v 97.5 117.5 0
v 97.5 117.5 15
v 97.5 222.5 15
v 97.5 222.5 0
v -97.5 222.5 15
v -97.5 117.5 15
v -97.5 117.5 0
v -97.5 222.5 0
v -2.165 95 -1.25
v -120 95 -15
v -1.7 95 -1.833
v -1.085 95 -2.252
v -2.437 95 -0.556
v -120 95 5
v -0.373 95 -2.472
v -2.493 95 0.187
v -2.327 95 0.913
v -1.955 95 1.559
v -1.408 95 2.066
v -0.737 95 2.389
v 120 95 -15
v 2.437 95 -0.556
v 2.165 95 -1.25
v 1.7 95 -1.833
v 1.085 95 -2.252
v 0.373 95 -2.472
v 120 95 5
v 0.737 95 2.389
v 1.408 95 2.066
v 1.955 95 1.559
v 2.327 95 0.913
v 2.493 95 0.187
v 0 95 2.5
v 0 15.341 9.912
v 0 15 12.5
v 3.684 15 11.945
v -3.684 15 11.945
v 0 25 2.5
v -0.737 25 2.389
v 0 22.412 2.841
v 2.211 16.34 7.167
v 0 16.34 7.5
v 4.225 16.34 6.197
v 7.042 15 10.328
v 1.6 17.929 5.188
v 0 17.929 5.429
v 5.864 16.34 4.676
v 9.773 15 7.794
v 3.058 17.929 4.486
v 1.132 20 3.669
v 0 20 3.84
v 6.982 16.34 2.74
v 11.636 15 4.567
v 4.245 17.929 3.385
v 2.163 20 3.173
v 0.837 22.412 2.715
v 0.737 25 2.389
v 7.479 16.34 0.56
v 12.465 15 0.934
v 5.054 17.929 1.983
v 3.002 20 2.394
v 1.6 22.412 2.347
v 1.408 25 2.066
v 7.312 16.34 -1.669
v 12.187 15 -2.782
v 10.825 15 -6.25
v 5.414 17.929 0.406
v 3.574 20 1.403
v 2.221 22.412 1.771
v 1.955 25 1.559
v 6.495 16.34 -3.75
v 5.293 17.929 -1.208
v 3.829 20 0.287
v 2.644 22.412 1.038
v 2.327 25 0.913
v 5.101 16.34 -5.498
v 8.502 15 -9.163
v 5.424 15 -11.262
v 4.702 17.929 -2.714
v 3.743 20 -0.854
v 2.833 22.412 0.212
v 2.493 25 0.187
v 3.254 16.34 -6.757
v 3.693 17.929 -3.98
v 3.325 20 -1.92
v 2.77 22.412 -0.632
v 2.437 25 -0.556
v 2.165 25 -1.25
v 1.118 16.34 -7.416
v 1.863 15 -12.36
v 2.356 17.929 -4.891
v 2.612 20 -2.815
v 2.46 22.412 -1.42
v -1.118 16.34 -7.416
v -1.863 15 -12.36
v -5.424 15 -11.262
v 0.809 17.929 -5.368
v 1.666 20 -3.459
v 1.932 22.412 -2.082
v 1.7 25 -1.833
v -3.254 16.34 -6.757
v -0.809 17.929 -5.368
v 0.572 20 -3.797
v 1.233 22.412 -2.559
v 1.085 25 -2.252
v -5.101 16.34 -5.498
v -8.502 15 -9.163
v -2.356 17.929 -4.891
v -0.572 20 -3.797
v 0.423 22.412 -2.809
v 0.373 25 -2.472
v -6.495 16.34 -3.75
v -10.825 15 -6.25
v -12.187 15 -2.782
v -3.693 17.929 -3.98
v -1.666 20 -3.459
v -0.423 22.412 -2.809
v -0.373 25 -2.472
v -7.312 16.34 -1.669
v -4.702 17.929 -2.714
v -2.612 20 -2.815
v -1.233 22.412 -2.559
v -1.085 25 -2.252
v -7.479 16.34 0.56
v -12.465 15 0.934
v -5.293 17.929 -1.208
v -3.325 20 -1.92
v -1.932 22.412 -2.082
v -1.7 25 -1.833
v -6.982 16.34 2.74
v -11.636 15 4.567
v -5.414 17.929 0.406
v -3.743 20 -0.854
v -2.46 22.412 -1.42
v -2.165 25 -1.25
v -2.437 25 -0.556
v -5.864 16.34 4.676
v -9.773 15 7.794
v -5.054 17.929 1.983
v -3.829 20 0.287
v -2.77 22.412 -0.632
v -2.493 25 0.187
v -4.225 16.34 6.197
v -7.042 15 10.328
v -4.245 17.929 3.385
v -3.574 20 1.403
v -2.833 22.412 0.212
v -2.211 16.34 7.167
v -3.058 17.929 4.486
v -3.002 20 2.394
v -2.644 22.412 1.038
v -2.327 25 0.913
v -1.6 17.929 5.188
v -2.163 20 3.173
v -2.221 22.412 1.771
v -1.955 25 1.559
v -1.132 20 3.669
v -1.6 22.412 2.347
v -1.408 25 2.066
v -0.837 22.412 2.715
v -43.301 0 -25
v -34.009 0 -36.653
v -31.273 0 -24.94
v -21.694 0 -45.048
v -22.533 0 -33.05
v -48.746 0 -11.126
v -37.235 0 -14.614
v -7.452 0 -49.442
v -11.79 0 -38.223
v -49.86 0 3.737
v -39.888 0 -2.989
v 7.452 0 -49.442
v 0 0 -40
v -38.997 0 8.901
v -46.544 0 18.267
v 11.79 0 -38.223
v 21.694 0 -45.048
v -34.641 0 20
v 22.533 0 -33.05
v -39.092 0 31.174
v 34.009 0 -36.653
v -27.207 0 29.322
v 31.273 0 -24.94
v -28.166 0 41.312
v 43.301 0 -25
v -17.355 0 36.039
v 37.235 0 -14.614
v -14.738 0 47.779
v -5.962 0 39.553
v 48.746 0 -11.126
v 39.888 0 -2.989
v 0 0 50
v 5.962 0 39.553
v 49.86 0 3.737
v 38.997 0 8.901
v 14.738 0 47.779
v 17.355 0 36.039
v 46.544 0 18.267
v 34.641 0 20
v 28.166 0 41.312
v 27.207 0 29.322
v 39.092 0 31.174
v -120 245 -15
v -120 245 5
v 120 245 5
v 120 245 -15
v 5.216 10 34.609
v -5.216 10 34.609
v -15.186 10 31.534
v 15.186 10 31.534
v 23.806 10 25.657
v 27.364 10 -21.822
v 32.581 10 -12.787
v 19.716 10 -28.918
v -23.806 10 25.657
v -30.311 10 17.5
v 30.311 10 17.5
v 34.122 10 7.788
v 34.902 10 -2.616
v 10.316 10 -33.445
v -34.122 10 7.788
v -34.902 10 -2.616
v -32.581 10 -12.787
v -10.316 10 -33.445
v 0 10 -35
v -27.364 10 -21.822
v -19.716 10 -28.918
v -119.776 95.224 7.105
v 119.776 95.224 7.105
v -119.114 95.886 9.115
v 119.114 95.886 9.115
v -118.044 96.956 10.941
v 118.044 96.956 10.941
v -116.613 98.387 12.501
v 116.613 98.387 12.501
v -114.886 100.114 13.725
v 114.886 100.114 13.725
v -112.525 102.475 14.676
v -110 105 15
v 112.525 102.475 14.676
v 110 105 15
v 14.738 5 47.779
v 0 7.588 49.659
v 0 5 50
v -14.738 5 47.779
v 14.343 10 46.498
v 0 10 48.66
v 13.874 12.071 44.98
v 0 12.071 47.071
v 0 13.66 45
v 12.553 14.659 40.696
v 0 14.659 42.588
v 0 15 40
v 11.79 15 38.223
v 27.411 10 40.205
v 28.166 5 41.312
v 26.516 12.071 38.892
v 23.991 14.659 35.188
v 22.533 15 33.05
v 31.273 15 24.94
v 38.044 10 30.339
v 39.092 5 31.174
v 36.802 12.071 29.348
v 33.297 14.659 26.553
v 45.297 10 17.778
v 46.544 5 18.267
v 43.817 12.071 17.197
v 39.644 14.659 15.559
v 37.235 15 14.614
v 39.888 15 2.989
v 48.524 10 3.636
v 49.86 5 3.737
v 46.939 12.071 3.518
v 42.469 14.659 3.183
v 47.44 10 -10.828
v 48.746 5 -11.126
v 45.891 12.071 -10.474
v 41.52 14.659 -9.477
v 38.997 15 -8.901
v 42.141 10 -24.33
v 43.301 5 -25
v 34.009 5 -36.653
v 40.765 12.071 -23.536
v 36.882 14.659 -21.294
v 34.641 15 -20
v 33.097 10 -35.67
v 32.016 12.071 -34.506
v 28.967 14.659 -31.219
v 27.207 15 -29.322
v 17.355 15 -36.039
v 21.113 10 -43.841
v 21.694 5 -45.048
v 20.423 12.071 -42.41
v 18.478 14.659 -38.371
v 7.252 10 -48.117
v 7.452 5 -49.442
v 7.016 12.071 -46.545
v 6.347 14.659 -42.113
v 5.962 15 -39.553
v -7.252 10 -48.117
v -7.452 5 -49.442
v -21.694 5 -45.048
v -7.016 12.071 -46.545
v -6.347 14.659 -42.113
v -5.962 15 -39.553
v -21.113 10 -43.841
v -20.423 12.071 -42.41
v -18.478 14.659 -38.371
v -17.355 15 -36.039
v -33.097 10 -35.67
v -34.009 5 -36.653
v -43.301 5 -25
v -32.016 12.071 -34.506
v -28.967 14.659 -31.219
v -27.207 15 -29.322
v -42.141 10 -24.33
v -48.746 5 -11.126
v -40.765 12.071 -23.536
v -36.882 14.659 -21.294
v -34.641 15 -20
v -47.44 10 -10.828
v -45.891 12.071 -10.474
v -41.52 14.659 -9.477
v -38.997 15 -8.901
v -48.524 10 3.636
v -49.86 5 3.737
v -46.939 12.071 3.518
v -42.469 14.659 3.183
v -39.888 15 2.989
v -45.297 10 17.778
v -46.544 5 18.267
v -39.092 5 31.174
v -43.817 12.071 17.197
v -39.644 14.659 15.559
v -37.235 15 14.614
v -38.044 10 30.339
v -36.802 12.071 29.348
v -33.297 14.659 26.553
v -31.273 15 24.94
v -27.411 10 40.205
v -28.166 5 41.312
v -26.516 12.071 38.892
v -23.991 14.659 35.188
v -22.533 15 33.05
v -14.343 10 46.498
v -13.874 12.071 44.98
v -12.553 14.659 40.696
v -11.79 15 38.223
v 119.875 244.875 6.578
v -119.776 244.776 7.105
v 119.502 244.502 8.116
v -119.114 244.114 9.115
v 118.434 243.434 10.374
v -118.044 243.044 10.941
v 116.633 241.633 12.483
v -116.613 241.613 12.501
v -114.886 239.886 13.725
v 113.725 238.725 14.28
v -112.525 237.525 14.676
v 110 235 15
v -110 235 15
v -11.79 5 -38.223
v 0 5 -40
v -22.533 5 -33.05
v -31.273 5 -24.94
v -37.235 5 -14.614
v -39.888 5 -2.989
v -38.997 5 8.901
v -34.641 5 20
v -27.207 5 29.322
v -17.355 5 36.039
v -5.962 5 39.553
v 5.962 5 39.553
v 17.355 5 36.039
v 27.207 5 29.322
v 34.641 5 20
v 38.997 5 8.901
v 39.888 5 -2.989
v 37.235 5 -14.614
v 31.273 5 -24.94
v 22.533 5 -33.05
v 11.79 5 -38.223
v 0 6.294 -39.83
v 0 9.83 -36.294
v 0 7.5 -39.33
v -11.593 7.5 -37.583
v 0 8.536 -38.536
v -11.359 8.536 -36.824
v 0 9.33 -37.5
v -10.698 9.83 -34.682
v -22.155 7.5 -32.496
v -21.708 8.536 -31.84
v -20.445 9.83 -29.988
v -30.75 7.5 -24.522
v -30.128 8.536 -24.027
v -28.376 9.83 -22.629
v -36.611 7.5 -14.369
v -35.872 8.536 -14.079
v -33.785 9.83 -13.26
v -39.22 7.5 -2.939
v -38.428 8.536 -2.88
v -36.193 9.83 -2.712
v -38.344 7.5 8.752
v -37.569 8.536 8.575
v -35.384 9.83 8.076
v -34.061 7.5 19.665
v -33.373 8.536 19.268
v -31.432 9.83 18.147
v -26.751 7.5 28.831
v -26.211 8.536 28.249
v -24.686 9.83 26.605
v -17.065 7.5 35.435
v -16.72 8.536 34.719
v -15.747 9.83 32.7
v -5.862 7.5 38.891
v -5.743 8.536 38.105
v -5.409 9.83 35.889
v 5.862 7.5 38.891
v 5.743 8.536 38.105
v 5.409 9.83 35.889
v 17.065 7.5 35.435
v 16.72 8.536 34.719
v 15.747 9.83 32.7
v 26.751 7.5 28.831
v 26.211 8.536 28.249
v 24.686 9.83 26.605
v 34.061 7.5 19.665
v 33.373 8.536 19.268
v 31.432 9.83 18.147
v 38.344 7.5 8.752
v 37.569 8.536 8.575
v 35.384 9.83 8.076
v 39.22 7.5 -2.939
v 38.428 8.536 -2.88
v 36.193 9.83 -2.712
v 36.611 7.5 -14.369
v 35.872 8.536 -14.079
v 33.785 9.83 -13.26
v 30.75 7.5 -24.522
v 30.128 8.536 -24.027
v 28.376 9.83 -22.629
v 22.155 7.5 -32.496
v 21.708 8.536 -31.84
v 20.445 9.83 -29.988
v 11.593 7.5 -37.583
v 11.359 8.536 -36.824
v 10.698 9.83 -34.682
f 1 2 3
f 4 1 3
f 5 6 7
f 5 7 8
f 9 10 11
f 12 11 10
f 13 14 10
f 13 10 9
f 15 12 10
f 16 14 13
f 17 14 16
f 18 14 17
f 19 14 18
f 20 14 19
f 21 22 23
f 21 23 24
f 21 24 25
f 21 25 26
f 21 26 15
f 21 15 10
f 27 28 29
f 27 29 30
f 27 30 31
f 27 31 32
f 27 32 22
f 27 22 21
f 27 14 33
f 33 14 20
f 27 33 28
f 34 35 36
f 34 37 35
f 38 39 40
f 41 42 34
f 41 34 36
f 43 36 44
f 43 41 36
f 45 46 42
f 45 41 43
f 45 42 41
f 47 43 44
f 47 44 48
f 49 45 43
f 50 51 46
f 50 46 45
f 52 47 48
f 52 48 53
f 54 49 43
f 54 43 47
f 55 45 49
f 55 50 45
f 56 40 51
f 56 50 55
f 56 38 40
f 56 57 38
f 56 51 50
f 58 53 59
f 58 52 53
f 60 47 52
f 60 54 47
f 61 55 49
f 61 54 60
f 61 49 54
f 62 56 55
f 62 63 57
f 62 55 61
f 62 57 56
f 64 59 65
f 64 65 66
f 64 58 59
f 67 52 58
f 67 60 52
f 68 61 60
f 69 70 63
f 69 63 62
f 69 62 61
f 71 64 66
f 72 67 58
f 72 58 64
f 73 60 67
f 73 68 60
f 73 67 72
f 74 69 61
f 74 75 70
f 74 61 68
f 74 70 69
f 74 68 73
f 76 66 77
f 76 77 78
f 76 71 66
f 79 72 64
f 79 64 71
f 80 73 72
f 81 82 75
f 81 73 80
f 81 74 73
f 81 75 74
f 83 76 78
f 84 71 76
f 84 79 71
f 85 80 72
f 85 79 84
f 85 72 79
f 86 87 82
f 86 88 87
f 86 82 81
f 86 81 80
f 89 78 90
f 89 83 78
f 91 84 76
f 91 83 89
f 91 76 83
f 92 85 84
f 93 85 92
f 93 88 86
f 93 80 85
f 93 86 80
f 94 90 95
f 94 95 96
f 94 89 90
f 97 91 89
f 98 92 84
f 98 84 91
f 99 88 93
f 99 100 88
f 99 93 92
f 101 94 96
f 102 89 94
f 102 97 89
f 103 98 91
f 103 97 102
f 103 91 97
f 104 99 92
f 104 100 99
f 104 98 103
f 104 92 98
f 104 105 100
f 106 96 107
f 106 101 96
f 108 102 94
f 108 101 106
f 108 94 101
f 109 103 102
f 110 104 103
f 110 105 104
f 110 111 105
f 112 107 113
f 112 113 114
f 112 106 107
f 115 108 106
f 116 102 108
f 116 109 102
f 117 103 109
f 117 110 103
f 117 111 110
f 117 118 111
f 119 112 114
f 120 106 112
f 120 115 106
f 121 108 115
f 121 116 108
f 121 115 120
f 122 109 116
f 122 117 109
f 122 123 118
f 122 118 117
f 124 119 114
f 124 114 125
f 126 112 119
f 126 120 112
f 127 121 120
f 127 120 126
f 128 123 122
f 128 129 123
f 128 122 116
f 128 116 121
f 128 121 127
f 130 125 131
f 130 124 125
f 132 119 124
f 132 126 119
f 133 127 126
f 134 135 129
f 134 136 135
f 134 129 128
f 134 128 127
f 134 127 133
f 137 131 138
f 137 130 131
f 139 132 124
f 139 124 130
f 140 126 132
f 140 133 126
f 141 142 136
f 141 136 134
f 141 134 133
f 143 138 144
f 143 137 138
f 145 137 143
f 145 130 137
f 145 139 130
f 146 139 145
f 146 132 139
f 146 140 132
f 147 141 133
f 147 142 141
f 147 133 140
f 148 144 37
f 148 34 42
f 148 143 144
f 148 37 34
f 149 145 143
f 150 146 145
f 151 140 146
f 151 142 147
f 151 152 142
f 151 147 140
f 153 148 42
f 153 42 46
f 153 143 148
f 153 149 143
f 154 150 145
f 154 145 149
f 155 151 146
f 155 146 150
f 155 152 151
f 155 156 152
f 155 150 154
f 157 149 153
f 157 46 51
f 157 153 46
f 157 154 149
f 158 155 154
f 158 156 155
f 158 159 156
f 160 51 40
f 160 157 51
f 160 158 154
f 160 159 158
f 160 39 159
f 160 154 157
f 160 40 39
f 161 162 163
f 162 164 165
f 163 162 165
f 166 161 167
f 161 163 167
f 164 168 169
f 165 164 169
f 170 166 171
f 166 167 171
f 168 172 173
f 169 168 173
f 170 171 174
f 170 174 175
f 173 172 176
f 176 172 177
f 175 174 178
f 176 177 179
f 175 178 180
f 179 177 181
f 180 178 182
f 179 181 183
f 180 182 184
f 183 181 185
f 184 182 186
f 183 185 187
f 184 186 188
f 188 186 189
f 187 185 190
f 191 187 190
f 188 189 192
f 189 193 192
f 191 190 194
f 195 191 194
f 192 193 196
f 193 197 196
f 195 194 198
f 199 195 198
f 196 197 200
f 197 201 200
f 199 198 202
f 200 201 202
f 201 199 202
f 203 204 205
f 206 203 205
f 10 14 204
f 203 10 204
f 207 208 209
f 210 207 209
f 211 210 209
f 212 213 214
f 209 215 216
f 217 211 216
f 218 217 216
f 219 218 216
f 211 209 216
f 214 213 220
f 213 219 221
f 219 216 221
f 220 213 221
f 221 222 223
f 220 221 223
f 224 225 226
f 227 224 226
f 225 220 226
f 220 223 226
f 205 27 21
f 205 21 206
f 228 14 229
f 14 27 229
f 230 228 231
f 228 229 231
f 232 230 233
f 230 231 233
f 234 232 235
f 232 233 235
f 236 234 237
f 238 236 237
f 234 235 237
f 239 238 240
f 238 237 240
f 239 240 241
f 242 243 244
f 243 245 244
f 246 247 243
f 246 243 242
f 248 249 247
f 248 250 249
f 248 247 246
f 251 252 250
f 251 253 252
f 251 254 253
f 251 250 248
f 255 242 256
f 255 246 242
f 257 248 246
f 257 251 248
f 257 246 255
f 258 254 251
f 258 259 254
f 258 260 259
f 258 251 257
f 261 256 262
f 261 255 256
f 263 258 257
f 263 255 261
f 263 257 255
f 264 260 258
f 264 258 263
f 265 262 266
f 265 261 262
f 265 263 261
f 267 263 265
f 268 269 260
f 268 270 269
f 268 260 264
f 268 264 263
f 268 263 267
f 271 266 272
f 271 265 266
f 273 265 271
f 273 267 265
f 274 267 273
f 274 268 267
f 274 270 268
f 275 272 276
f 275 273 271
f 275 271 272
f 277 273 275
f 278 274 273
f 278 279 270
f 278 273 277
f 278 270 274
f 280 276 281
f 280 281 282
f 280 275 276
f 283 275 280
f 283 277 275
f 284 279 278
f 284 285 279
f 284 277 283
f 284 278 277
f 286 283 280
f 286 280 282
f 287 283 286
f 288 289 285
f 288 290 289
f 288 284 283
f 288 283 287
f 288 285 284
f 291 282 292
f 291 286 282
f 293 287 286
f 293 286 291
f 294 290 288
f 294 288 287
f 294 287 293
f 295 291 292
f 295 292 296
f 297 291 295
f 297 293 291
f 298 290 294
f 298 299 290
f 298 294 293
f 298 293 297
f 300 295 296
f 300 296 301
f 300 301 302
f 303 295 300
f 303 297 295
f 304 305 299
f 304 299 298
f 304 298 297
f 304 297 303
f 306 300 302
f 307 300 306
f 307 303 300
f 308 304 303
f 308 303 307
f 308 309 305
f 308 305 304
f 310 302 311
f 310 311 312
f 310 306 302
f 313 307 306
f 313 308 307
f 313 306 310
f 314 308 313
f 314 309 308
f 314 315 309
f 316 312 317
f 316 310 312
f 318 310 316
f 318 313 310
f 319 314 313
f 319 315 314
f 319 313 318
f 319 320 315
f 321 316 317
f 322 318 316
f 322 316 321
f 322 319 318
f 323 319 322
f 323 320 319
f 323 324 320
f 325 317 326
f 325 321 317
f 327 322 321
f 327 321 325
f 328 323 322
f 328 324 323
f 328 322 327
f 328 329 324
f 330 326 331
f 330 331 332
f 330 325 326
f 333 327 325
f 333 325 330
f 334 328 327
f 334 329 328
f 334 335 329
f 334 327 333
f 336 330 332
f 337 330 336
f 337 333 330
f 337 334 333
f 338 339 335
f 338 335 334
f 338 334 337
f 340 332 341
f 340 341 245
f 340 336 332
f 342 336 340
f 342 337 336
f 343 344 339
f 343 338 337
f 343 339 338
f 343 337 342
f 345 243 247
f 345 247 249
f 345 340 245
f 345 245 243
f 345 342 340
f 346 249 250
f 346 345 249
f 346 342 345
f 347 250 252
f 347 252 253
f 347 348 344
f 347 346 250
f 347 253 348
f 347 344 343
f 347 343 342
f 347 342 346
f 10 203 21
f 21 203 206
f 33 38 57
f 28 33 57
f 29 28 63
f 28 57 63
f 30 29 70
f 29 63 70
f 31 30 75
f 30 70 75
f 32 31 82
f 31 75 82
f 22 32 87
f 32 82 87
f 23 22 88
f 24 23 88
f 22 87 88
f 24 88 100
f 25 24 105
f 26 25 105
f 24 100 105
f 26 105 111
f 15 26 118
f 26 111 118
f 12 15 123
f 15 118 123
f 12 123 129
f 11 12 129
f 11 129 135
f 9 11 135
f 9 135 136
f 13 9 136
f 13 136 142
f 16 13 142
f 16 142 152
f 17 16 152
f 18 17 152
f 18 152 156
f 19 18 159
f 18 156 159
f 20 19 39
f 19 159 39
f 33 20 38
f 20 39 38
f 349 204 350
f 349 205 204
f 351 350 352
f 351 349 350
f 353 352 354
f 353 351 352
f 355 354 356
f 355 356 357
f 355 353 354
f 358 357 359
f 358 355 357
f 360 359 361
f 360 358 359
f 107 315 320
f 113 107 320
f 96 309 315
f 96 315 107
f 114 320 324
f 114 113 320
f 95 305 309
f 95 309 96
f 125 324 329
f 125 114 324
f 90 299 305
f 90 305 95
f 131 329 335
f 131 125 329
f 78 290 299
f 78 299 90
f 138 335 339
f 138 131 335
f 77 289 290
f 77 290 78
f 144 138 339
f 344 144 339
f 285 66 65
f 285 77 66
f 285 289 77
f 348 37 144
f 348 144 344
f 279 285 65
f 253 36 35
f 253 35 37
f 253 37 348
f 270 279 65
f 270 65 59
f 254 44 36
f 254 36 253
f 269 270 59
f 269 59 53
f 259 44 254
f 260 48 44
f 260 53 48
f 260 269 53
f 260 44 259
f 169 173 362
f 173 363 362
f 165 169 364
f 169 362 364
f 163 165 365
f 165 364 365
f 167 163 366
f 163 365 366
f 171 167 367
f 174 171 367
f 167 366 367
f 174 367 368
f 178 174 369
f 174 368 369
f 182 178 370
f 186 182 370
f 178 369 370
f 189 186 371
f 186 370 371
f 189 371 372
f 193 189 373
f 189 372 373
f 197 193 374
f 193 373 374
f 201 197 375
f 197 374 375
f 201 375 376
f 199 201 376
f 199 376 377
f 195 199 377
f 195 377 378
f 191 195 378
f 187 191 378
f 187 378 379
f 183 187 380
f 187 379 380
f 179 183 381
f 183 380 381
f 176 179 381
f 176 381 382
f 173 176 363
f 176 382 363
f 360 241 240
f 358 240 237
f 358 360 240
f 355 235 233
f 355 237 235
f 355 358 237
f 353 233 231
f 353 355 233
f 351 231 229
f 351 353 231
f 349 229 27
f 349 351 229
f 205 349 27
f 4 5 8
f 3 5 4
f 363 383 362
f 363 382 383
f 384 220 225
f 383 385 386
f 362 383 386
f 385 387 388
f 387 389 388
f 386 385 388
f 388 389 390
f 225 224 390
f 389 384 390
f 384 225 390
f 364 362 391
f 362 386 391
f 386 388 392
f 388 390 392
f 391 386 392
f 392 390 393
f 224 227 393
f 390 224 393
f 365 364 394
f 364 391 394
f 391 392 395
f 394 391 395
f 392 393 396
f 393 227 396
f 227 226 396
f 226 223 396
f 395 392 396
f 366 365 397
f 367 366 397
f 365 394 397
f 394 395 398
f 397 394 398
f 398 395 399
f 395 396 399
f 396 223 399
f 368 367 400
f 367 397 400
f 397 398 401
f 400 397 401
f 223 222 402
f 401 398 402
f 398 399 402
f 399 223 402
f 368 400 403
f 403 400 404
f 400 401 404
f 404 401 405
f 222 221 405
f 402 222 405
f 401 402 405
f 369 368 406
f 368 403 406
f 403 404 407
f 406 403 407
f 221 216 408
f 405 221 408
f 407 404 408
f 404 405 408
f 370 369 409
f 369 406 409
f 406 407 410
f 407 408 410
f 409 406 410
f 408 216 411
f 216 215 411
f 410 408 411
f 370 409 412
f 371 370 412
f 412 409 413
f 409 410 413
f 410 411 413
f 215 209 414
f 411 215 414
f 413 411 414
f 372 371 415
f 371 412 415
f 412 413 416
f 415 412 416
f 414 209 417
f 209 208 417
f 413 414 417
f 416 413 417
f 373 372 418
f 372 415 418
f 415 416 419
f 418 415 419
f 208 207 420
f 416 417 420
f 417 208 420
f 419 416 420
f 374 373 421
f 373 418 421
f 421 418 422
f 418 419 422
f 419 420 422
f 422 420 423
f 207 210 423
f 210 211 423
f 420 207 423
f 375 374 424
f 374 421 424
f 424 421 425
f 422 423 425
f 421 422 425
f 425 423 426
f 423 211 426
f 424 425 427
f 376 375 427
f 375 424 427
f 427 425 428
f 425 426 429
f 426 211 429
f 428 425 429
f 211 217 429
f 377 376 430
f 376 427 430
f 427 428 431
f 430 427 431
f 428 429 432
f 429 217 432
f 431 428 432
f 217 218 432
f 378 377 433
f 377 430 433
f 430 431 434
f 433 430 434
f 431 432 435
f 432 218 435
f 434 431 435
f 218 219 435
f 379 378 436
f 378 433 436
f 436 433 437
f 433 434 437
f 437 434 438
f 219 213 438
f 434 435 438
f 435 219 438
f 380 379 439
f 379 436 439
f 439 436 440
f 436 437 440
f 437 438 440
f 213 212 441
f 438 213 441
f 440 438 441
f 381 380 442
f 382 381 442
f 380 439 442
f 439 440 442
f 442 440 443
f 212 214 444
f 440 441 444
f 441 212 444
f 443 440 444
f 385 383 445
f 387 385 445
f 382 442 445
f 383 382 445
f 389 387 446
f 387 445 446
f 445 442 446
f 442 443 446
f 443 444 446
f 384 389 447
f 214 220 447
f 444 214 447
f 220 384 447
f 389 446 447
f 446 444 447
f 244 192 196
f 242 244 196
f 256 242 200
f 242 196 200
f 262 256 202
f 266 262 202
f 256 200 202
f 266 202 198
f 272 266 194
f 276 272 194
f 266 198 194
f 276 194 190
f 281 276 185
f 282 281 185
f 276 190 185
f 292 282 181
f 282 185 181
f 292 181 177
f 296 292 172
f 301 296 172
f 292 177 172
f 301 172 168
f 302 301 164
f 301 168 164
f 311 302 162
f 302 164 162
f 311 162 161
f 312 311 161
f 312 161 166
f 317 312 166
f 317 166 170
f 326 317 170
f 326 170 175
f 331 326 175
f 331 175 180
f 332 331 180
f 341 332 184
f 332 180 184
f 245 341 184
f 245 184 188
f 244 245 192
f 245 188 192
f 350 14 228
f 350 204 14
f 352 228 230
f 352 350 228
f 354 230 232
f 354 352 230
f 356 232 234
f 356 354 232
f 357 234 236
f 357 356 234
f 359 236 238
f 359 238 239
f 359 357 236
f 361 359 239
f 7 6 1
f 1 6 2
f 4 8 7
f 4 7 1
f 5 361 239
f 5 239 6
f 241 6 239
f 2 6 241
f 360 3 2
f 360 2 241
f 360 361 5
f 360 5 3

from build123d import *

# Parameters (mm, degrees)
SKETCH1_R           = 50
BOSS_EXTRUDE1_DEPTH = 15
FILLET1_R           = 10
SKETCH5_R           = 2.5
BOSS_EXTRUDE2_DEPTH = 80
FILLET2_R           = 10
SKETCH6_W           = 240
SKETCH6_H           = 150
BOSS_EXTRUDE3_DEPTH = 15
SKETCH7_W           = 195
SKETCH7_H           = 105
CUT_EXTRUDE1_DEPTH  = 15
FILLET3_R           = 10


with BuildPart() as part:
    # Sketch1 → Boss-Extrude1 (new body)
    with BuildSketch(Plane(origin=(0, 0, 0), x_dir=(1, 0, 0), z_dir=(0, 1, 0))):
        with Locations(Location((0, 0, 0), (0, 0, 270))):
            Circle(SKETCH1_R)
    extrude(amount=BOSS_EXTRUDE1_DEPTH)

    # Fillet1
    fillet1_edges = [part.edges().sort_by_distance(p)[0] for p in [
        (0, 15, -50),
    ]]
    fillet(fillet1_edges, radius=FILLET1_R)

    # Sketch3 → Cut-Revolve1 (revolve, cut)
    with BuildSketch(Plane.XY, mode=Mode.PRIVATE) as cut_revolve1_sk:
        with BuildLine():
            Line((0, 0), (40, 0))
            Line((40, 0), (40, 5))
            ThreePointArc((40, 5), (38.535533906, 8.535533906), (35, 10))
            Line((35, 10), (0, 10))
            Line((0, 10), (0, 0))
        make_face()
    revolve(cut_revolve1_sk.sketch.rotate(Axis((0, 0, 0), (0, 1, 0)), 90), axis=Axis((0, 0, 0), (0, 1, 0)), mode=Mode.SUBTRACT)

    # Sketch5 → Boss-Extrude2 (add)
    with BuildSketch(Plane(origin=(0, 15, 0), x_dir=(1, 0, 0), z_dir=(0, 1, 0))):
        with Locations(Location((0, 0, 0), (0, 0, 270))):
            Circle(SKETCH5_R)
    extrude(amount=BOSS_EXTRUDE2_DEPTH)

    # Fillet2
    fillet2_edges = [part.edges().sort_by_distance(p)[0] for p in [
        (0, 15, -2.5),
    ]]
    fillet(fillet2_edges, radius=FILLET2_R)

    # Sketch6 → Boss-Extrude3 (add, symmetric)
    with BuildSketch(Plane.XY):
        with Locations((0, 170)):
            Rectangle(SKETCH6_W, SKETCH6_H)
    extrude(amount=BOSS_EXTRUDE3_DEPTH, both=True)

    # Sketch7 → Cut-Extrude1 (cut)
    with BuildSketch(Plane.XY.offset(15)):
        with Locations((0, 170)):
            Rectangle(SKETCH7_W, SKETCH7_H)
    extrude(amount=-CUT_EXTRUDE1_DEPTH, mode=Mode.SUBTRACT)

    # Fillet3
    fillet3_edges = [part.edges().sort_by_distance(p)[0] for p in [
        (-120, 170, 15),
        (0, 95, 15),
        (120, 170, 15),
        (0, 245, 15),
    ]]
    fillet(fillet3_edges, radius=FILLET3_R)


solid = part.part
